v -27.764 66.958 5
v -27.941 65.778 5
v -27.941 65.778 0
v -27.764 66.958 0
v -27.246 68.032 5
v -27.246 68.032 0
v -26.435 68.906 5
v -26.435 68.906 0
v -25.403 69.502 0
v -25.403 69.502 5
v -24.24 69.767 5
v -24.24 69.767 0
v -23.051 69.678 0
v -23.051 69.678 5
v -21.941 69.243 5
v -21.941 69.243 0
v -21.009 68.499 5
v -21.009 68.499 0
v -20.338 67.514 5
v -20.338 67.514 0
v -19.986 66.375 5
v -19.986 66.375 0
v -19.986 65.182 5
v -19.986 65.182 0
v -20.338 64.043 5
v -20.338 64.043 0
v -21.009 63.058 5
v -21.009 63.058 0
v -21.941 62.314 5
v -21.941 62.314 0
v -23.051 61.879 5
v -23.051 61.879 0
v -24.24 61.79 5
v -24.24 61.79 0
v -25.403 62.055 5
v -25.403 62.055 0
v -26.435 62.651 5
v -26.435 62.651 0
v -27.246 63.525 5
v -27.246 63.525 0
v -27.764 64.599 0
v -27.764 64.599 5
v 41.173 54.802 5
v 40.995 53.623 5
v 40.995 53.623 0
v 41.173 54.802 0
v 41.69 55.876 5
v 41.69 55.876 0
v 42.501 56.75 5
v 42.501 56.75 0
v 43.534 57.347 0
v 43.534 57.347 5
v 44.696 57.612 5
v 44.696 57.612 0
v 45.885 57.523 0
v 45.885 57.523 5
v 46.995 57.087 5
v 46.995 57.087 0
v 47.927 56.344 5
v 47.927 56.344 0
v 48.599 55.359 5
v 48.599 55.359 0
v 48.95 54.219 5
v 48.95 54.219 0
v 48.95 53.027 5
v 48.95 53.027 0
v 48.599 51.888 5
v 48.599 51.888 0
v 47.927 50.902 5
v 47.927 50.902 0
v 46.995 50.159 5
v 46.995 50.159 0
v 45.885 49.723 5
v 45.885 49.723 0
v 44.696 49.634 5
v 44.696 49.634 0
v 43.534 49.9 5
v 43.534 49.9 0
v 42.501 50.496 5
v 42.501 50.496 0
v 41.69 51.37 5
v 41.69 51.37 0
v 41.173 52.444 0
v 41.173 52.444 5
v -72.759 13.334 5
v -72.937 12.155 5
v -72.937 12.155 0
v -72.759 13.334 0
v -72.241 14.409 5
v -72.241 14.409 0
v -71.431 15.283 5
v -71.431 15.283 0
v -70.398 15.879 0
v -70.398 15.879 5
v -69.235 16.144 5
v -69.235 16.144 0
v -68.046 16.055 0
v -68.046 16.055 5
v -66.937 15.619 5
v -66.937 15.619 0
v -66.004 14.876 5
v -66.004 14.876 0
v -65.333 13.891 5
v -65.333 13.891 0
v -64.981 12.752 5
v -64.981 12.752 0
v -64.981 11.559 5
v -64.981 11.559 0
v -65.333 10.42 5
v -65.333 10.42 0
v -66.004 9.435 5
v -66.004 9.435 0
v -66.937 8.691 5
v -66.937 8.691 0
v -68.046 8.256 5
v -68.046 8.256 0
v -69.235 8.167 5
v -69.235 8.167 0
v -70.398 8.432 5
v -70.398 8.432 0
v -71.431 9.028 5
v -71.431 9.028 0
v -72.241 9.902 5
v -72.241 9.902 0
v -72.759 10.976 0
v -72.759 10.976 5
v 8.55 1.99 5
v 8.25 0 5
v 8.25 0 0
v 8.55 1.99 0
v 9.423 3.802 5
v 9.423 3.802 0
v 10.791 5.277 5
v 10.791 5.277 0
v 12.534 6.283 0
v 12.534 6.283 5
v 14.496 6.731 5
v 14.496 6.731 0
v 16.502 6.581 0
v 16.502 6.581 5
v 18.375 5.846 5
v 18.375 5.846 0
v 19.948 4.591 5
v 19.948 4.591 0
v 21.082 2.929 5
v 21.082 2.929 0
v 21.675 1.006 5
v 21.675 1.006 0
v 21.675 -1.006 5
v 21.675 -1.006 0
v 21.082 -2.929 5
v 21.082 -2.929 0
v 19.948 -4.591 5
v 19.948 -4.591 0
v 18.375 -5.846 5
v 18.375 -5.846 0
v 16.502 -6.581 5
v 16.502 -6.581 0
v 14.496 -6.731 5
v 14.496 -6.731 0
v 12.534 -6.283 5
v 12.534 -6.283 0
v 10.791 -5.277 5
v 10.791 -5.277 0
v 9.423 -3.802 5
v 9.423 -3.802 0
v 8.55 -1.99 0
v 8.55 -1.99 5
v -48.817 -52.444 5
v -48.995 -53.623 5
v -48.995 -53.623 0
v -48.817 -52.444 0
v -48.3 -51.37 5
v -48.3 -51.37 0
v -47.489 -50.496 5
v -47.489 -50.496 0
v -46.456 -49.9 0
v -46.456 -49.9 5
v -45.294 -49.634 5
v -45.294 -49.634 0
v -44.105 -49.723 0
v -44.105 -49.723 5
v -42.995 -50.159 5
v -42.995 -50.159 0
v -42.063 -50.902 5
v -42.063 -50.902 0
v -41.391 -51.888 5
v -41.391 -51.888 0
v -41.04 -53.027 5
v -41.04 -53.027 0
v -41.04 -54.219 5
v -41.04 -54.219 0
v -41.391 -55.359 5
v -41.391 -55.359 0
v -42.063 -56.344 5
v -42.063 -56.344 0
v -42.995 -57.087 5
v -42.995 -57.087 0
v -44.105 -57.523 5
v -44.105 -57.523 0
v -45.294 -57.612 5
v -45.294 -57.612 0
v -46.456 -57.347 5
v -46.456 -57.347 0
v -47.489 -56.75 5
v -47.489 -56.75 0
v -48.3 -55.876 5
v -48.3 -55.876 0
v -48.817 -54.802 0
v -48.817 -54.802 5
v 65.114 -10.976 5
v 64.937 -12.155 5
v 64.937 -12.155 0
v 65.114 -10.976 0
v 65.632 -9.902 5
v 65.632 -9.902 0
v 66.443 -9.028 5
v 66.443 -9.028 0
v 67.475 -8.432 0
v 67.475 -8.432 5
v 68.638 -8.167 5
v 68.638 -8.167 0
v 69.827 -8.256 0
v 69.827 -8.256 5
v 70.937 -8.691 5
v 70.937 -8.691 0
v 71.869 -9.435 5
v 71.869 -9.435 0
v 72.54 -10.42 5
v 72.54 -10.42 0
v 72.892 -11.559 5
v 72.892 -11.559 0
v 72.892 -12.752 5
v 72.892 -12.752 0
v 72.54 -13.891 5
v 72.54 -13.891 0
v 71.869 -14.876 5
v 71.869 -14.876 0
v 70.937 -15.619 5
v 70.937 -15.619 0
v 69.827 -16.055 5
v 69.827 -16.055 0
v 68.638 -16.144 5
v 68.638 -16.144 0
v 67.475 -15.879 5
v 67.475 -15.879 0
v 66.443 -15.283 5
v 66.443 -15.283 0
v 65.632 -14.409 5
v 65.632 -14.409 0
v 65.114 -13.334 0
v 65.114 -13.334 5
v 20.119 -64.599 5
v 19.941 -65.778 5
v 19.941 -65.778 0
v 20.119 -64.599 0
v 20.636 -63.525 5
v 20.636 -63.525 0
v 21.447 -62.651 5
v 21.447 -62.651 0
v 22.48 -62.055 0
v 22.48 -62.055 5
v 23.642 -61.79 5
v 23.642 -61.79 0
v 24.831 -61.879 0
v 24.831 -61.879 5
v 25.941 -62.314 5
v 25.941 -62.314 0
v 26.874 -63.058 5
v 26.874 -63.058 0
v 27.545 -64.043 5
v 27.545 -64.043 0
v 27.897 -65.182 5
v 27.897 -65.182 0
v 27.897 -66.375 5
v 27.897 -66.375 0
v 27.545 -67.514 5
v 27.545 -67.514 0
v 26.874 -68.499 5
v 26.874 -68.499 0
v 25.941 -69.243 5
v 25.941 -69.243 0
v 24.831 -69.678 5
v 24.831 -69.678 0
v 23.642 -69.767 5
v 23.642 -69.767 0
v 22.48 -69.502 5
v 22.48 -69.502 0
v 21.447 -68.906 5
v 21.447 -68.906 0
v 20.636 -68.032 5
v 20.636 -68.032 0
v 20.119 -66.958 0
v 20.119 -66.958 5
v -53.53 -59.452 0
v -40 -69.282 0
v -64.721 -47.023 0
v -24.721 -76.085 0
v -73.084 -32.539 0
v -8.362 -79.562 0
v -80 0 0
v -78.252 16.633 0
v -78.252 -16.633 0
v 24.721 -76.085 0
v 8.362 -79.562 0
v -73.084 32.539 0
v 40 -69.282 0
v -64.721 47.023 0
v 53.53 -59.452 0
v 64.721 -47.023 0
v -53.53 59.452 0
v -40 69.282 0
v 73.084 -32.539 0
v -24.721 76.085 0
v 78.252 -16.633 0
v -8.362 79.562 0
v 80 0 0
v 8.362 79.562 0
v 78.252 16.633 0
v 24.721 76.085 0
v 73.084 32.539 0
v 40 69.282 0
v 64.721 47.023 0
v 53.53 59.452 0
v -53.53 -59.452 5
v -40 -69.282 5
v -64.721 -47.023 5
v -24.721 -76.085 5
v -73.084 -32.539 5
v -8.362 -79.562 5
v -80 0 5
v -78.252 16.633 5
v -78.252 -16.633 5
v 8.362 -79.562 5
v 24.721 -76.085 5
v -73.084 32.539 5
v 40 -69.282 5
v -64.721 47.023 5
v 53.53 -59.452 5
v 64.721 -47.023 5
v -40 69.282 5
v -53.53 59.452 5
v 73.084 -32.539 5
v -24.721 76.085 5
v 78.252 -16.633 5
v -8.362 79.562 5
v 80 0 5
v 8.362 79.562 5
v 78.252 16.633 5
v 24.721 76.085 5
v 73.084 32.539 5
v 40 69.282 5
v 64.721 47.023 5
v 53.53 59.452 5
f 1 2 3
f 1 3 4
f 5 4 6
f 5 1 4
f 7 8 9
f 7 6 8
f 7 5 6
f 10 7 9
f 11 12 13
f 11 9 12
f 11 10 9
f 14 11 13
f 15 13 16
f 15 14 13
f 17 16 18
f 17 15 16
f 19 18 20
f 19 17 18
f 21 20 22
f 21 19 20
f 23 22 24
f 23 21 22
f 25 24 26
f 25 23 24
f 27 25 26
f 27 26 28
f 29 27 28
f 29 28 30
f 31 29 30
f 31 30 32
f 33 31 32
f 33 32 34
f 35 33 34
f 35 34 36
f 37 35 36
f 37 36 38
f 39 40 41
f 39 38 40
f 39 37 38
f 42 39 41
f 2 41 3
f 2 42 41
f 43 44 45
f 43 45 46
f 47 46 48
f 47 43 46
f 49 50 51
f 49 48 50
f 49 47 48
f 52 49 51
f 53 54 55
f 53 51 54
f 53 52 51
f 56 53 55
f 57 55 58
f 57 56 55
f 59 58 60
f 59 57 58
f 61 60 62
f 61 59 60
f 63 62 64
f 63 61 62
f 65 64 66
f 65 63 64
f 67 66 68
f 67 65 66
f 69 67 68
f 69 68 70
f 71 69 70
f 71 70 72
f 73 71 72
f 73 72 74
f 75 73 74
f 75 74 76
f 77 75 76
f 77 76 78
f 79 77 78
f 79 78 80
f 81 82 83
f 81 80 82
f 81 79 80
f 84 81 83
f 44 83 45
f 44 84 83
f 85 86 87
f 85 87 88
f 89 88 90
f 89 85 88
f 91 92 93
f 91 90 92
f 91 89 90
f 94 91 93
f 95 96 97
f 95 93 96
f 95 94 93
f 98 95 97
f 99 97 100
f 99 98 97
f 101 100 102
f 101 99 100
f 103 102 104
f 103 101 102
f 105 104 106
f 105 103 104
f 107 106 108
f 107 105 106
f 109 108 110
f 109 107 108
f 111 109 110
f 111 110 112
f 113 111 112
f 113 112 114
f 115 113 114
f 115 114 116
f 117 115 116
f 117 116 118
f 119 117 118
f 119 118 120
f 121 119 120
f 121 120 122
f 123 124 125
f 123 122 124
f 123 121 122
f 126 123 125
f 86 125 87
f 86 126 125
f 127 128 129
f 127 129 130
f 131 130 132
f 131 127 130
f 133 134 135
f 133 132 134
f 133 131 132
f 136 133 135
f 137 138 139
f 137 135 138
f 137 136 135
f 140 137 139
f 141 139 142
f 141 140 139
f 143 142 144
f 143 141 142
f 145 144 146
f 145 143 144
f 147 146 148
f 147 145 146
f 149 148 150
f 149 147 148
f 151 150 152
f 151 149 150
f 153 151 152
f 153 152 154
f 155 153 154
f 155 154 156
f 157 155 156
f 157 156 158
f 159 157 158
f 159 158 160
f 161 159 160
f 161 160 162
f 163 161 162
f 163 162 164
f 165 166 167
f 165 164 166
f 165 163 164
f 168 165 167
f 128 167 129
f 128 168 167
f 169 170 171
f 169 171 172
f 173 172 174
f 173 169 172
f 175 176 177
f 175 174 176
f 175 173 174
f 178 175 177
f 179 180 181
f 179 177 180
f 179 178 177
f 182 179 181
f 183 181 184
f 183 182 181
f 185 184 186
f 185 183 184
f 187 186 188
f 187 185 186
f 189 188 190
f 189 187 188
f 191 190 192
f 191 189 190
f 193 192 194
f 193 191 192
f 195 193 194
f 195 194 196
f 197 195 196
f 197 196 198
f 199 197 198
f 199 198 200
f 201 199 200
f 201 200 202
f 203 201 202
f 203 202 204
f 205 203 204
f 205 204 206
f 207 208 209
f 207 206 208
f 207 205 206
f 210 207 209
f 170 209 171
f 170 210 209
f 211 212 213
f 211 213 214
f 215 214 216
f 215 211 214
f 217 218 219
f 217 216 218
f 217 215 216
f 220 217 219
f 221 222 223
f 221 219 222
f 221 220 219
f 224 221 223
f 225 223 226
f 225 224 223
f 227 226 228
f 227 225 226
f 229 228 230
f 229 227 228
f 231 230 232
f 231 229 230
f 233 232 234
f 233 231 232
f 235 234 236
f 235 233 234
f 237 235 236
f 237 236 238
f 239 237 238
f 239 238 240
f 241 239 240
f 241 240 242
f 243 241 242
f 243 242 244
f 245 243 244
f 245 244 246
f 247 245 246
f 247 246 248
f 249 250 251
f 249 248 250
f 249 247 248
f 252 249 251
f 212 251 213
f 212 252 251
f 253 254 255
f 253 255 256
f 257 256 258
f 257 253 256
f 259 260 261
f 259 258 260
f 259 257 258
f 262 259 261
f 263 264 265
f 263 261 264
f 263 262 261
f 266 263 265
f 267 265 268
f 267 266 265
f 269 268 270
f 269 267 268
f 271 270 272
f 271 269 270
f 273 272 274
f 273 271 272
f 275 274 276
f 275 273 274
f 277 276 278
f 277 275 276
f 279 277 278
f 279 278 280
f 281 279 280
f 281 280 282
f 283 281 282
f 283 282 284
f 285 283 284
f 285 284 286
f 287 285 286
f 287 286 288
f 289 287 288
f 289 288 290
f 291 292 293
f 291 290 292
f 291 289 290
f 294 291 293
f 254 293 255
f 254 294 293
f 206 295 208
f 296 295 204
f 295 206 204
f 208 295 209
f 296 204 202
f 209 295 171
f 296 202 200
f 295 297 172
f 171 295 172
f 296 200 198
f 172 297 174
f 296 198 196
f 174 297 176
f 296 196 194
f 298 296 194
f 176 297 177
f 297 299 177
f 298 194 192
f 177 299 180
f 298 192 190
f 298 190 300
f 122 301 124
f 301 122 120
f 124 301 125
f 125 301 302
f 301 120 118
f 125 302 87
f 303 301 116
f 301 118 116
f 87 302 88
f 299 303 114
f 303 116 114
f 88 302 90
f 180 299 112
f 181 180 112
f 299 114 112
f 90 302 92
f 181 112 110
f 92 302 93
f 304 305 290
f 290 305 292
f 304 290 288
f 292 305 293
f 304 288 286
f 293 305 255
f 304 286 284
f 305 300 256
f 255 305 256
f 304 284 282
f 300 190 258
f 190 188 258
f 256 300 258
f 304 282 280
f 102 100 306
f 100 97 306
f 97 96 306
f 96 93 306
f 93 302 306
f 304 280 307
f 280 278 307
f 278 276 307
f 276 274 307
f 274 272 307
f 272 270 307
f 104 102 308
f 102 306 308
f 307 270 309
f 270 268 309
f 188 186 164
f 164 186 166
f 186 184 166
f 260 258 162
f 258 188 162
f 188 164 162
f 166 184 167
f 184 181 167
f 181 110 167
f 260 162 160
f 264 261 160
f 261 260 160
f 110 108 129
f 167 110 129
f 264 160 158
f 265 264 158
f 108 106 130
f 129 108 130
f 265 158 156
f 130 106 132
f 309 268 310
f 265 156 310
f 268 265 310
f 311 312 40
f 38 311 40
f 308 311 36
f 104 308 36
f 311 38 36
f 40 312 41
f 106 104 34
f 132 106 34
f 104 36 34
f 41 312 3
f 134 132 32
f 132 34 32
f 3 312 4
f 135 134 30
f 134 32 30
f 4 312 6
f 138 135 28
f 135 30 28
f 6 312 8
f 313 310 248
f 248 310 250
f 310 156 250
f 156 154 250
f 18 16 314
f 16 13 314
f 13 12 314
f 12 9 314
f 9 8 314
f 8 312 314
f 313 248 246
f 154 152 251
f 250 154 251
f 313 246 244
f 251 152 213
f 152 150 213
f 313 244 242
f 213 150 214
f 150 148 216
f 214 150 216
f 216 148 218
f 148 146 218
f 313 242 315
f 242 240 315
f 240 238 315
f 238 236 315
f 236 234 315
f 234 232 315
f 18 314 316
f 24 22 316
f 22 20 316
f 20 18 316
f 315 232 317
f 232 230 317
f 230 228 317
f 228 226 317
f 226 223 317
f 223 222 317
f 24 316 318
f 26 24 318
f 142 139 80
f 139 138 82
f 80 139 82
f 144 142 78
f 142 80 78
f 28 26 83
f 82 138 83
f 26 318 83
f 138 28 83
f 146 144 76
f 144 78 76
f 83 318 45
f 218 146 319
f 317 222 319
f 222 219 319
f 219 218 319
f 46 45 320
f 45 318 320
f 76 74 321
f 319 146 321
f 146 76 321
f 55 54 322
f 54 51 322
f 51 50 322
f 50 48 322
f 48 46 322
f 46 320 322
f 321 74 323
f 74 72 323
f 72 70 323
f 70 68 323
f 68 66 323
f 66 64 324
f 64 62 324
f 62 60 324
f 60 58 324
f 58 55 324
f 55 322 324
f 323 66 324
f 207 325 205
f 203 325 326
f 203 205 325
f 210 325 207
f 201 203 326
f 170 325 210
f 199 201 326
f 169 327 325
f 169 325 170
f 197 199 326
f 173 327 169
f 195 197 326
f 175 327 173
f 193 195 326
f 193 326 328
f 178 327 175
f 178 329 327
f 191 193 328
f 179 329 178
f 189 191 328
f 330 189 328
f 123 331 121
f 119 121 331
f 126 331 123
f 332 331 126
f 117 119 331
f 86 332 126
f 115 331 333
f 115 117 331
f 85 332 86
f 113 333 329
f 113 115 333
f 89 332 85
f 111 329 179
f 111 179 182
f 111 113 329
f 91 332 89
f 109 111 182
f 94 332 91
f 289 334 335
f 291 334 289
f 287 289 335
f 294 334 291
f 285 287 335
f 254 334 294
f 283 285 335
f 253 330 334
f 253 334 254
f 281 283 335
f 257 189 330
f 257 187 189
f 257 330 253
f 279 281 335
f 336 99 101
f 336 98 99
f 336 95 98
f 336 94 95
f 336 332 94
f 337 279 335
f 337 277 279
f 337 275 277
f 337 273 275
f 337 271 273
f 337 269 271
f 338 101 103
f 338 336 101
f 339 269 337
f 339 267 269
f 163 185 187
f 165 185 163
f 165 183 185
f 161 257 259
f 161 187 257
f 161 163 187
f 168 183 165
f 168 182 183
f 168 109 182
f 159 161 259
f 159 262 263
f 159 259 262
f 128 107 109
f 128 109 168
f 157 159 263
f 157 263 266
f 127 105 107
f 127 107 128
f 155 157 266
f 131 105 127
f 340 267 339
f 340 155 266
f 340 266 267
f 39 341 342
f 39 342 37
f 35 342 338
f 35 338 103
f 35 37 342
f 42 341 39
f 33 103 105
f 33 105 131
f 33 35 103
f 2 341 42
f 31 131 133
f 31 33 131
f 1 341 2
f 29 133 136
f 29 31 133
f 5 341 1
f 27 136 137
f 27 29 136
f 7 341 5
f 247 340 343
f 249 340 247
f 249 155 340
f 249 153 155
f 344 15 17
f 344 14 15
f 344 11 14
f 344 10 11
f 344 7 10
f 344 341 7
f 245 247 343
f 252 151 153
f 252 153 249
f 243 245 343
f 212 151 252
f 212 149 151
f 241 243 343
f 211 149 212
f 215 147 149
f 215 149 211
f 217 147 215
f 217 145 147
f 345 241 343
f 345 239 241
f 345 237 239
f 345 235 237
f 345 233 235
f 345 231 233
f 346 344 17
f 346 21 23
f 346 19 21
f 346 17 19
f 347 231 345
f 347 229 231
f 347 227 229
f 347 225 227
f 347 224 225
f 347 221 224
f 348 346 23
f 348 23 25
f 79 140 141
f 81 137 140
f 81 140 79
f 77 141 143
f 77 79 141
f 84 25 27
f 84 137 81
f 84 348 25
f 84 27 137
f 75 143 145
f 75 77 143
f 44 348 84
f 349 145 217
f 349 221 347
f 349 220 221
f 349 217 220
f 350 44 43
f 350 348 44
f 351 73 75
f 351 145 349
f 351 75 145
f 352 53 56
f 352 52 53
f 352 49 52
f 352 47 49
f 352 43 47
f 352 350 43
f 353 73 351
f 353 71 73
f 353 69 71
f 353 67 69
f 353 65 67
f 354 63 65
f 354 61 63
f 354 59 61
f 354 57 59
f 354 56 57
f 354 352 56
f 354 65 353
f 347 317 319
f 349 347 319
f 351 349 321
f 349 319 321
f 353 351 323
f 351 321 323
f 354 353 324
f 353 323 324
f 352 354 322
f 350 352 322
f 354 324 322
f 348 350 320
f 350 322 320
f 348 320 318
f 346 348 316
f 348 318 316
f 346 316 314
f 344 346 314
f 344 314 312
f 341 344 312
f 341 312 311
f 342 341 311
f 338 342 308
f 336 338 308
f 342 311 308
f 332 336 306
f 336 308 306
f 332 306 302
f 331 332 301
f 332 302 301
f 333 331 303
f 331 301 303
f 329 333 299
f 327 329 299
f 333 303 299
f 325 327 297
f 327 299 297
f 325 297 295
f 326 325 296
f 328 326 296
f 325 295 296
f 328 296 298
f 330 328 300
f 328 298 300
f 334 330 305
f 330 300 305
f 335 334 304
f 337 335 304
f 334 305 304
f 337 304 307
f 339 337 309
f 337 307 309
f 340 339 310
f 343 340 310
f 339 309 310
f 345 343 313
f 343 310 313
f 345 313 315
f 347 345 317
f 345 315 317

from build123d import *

# Parameters (mm, degrees)
ESBO_O1_R                  = 80
RESSALTO_EXTRUS_O1_DEPTH   = 5
CORTE_EXTRUS_O1_DEPTH      = 114.247516529
CORTE_EXTRUS_O1_DEPTH_BACK = 114.247516529
ESBO_O3_R                  = 6.75
CORTE_EXTRUS_O2_DEPTH      = 114.247516529
CORTE_EXTRUS_O2_DEPTH_BACK = 114.247516529
ESBO_O5_R                  = 4


with BuildPart() as part:
    # Esboço1 → Ressalto-extrusão1 (new body)
    with BuildSketch(Plane.XY):
        Circle(ESBO_O1_R)
    extrude(amount=RESSALTO_EXTRUS_O1_DEPTH)

    # Esboço3 → Corte-extrusão1 (cut, two sides: drawn at the far end of the back side and taken through both)
    with BuildSketch(Plane(origin=(0, 0, 0), x_dir=(-1, 0, 0), z_dir=(0, 0, -1)).offset(-CORTE_EXTRUS_O1_DEPTH_BACK)):
        with Locations((-15, 0)):
            Circle(ESBO_O3_R)
    extrude(amount=CORTE_EXTRUS_O1_DEPTH + CORTE_EXTRUS_O1_DEPTH_BACK, mode=Mode.SUBTRACT)

    # Esboço5 → Corte-extrusão2 (cut, two sides: drawn at the far end of the back side and taken through both)
    with BuildSketch(Plane(origin=(0, 0, 0), x_dir=(-1, 0, 0), z_dir=(0, 0, -1)).offset(-CORTE_EXTRUS_O2_DEPTH_BACK)):
        with Locations((23.941410033, 65.778483455)):
            Circle(ESBO_O5_R)
        with Locations((68.936542711, 12.155372437)):
            Circle(ESBO_O5_R)
        with Locations((44.995132678, -53.623111018)):
            Circle(ESBO_O5_R)
        with Locations((-23.941410033, -65.778483455)):
            Circle(ESBO_O5_R)
        with Locations((-68.936542711, -12.155372437)):
            Circle(ESBO_O5_R)
        with Locations((-44.995132678, 53.623111018)):
            Circle(ESBO_O5_R)
    extrude(amount=CORTE_EXTRUS_O2_DEPTH + CORTE_EXTRUS_O2_DEPTH_BACK, mode=Mode.SUBTRACT)


solid = part.part
